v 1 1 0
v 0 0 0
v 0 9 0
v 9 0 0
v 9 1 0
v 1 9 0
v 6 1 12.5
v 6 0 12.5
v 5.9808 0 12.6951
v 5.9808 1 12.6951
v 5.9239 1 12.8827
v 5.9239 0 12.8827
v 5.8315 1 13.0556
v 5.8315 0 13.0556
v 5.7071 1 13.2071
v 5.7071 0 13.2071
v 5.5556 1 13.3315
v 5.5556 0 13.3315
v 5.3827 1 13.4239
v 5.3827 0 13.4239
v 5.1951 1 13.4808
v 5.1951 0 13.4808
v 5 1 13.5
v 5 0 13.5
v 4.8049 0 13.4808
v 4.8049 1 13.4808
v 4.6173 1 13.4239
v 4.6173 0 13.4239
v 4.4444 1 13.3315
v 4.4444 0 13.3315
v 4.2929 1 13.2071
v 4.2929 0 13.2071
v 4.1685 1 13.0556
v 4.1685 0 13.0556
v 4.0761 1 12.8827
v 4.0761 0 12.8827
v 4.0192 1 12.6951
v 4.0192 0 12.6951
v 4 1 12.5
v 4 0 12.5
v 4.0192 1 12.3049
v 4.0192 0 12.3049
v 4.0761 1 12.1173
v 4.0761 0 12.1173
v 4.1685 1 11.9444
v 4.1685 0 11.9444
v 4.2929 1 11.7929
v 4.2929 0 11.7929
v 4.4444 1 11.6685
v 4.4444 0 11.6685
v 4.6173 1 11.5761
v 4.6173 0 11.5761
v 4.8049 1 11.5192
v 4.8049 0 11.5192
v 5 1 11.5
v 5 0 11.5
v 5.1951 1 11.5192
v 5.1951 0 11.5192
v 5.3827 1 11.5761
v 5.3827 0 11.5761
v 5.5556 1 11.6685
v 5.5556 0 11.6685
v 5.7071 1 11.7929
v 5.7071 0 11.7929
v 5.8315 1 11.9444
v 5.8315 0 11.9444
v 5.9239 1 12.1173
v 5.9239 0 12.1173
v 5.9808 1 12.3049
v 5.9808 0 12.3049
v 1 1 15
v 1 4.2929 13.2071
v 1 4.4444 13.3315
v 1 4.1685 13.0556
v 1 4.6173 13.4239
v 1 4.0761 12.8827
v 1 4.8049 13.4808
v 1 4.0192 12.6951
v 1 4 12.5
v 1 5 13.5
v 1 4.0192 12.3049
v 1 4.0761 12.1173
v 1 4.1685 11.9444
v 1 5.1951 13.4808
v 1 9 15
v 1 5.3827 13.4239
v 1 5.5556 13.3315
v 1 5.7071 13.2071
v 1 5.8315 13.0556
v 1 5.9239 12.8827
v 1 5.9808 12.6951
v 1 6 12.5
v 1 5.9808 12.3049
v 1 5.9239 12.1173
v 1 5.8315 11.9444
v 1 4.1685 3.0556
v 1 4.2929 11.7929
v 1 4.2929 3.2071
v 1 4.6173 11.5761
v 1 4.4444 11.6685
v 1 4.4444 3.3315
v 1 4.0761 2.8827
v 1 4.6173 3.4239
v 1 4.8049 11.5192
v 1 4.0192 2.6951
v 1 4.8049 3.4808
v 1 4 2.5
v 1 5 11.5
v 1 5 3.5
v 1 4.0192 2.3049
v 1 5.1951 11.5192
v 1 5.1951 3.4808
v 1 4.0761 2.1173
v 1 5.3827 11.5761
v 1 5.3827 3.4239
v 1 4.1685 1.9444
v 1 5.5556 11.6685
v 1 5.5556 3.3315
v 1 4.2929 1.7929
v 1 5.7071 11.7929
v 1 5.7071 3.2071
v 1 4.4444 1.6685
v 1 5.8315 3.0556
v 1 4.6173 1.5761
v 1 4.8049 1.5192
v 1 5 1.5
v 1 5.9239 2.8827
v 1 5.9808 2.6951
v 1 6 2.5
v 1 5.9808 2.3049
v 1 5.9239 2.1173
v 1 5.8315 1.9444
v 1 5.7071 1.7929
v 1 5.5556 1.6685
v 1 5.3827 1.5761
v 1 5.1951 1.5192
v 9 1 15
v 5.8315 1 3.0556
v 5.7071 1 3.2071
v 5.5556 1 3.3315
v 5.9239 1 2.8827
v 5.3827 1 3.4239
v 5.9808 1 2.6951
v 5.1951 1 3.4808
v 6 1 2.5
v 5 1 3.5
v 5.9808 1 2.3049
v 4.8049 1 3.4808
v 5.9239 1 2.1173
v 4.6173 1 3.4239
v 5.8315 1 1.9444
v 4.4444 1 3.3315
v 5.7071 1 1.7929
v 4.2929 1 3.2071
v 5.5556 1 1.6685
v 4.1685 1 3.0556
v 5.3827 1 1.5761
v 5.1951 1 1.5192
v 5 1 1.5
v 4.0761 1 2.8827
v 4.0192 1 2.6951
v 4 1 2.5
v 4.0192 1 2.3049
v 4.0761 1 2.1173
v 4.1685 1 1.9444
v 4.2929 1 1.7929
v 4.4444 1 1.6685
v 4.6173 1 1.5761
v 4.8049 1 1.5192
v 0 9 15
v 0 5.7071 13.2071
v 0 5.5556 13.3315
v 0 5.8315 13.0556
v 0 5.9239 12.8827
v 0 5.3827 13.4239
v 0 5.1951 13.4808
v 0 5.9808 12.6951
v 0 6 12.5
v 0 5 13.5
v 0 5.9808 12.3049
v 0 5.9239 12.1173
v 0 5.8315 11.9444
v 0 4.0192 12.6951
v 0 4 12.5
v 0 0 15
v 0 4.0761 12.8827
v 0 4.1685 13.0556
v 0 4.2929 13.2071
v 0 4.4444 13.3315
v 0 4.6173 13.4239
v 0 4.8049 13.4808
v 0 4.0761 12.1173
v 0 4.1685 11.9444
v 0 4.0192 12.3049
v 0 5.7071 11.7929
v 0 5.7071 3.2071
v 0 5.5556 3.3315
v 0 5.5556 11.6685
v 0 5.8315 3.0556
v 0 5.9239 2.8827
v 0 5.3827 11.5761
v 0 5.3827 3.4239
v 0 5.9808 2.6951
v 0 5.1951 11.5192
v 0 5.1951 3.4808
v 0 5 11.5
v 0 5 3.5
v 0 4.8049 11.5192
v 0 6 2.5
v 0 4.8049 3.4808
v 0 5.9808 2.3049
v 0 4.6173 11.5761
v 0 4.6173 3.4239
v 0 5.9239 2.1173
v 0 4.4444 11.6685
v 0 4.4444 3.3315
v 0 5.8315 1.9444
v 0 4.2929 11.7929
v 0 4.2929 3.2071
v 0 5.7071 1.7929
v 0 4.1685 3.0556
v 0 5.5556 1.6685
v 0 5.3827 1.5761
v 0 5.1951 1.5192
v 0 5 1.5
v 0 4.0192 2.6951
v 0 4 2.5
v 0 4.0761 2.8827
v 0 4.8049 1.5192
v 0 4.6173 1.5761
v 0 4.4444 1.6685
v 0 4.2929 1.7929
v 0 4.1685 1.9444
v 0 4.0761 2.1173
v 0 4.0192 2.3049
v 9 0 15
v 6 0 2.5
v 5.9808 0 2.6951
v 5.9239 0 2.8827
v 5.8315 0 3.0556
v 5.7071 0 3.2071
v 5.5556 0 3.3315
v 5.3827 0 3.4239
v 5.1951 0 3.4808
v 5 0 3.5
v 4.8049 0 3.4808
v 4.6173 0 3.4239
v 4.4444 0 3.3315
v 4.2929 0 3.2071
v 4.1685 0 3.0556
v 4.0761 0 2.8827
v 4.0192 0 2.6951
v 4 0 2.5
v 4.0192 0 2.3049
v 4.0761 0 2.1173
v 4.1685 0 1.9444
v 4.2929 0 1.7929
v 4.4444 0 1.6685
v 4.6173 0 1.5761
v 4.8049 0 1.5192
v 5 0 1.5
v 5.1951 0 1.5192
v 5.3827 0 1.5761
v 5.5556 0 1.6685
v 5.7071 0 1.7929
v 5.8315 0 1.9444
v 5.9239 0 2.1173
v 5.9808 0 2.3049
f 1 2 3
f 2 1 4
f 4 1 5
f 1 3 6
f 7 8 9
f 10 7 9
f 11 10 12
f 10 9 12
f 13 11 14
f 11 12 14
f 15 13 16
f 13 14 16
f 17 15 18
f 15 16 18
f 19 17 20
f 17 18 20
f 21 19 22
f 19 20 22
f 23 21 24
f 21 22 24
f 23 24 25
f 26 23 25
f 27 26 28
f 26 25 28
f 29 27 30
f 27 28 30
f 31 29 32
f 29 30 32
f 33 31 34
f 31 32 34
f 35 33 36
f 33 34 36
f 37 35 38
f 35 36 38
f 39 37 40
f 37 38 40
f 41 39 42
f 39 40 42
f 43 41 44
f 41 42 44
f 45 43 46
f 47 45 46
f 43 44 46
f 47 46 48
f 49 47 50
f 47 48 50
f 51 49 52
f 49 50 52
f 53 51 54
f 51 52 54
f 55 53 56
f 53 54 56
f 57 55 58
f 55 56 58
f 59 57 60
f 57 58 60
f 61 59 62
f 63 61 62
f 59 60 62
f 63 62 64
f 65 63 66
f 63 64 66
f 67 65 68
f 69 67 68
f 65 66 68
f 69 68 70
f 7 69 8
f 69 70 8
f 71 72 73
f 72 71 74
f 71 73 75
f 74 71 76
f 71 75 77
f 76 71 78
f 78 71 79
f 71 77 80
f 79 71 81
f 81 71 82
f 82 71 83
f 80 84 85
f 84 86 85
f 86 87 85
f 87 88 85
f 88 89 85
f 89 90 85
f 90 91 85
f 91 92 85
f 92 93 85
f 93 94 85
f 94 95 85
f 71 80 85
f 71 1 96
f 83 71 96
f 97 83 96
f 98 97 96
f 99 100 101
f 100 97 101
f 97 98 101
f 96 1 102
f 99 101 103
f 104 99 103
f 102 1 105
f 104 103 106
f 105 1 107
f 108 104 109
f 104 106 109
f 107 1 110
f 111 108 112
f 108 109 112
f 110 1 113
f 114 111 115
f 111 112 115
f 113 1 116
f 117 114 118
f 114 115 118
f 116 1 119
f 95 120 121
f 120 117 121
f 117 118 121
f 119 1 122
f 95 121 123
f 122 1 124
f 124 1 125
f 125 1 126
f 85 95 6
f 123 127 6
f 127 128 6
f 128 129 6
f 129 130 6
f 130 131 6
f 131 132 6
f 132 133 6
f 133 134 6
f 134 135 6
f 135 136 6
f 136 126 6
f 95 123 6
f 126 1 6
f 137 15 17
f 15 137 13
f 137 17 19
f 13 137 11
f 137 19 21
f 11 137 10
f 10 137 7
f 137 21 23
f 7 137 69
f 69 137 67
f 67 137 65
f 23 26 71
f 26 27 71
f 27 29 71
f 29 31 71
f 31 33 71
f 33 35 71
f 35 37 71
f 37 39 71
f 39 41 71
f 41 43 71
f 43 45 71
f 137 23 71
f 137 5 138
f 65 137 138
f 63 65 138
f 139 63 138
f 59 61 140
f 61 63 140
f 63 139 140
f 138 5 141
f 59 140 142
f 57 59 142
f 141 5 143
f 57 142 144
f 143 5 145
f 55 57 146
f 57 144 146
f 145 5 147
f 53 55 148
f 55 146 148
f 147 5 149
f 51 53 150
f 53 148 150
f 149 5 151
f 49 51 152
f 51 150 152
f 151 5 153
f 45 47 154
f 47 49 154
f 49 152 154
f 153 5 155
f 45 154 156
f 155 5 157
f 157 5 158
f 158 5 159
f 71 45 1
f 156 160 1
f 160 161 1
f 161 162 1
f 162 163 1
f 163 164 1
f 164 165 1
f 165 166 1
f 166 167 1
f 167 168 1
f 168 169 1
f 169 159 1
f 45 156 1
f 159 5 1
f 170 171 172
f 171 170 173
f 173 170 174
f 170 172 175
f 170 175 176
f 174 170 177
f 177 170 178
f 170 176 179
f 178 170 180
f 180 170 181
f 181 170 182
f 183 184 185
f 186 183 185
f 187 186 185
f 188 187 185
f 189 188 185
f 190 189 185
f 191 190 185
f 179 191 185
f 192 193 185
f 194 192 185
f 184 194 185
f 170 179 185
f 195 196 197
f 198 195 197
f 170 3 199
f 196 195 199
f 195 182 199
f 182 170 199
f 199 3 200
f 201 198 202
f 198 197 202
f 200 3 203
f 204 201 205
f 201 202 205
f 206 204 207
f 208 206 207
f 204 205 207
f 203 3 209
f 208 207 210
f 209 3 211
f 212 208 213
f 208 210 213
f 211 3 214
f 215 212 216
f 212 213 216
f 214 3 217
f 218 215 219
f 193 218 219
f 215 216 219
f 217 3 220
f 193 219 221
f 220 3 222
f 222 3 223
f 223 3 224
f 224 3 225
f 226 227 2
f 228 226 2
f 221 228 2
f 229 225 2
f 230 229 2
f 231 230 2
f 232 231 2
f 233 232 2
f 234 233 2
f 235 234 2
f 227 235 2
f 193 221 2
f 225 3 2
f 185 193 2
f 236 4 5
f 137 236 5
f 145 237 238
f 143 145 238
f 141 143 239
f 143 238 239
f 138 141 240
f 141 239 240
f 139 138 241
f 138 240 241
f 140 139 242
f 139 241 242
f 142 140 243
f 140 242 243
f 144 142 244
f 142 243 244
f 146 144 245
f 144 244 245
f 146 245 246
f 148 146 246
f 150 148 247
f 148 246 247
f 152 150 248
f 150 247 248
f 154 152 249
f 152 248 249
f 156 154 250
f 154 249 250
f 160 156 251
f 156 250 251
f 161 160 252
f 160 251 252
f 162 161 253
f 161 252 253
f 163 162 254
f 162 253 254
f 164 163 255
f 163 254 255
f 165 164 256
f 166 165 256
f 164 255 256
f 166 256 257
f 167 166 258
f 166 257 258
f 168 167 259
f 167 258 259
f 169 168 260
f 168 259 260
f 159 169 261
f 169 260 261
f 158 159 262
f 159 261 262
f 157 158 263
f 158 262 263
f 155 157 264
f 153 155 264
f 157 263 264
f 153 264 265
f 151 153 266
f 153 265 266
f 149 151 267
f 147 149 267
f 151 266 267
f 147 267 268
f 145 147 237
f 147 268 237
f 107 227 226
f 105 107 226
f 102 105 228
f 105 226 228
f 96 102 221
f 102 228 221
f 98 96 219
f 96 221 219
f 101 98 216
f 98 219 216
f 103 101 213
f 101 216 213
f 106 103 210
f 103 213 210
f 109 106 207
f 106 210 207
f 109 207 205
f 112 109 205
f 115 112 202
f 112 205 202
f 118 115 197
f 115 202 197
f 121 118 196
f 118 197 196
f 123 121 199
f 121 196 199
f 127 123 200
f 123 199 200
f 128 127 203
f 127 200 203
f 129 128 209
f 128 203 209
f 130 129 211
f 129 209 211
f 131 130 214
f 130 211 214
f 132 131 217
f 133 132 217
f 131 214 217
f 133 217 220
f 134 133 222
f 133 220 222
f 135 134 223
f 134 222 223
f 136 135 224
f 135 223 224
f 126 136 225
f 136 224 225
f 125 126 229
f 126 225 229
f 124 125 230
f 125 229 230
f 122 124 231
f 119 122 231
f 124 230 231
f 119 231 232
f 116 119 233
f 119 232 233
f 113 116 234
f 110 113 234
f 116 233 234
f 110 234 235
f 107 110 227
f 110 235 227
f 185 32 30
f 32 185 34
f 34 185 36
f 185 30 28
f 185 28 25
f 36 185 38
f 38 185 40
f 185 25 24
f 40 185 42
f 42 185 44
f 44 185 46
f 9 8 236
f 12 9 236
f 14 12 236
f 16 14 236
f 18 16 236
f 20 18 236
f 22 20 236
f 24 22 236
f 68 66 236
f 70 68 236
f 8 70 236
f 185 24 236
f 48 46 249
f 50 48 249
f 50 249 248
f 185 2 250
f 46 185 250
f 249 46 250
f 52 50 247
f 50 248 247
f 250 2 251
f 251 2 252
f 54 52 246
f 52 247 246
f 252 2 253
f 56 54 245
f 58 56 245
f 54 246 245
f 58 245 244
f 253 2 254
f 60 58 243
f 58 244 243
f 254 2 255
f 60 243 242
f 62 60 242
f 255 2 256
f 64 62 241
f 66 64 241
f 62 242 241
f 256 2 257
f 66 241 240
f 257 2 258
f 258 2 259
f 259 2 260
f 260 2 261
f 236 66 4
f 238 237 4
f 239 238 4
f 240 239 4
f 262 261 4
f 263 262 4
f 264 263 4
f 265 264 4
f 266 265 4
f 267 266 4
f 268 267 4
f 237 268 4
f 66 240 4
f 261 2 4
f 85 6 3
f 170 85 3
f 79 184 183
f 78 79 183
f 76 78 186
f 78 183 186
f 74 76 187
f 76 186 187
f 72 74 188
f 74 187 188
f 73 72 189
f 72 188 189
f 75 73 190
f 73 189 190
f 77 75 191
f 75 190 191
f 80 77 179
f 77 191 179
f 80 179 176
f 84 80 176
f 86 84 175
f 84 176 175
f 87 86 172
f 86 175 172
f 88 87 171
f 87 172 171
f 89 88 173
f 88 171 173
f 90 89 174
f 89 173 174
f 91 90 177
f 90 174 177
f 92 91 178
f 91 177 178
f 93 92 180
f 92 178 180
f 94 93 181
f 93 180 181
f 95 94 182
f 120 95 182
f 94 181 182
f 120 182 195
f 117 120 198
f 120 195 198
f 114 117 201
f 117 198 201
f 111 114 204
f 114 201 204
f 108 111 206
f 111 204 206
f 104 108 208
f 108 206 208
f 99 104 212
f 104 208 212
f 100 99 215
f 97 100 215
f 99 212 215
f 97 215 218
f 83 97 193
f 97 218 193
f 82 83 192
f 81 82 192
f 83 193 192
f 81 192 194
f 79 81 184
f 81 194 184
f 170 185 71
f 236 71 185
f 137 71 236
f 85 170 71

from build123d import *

# Parameters (mm, degrees)
F1_DEPTH = 15
F2_R     = 1
F3_DEPTH = 1
F4_R     = 1
F5_DEPTH = 1


with BuildPart() as f1:
    # F0 (on Top) → F1 (new body)
    with BuildSketch(Plane.XY):
        Polygon((0, 9), (0, 0), (9, 0), (9, 1), (1, 1), (1, 9), align=None)
    extrude(amount=F1_DEPTH)

    # F2 (on face) → F3 (cut, through all)
    with BuildSketch(Plane.XZ):
        with Locations((5, 12.5)):
            Circle(F2_R)
        with Locations((5, 2.5)):
            Circle(F2_R)
    extrude(amount=-F3_DEPTH, mode=Mode.SUBTRACT)

    # F4 (on face) → F5 (cut, through all)
    with BuildSketch(Plane(origin=(0, 0, 0), x_dir=(0, -1, 0), z_dir=(-1, 0, 0))):
        with Locations((-5, 12.5)):
            Circle(F4_R)
        with Locations((-5, 2.5)):
            Circle(F4_R)
    extrude(amount=-F5_DEPTH, mode=Mode.SUBTRACT)


solid = f1.part
